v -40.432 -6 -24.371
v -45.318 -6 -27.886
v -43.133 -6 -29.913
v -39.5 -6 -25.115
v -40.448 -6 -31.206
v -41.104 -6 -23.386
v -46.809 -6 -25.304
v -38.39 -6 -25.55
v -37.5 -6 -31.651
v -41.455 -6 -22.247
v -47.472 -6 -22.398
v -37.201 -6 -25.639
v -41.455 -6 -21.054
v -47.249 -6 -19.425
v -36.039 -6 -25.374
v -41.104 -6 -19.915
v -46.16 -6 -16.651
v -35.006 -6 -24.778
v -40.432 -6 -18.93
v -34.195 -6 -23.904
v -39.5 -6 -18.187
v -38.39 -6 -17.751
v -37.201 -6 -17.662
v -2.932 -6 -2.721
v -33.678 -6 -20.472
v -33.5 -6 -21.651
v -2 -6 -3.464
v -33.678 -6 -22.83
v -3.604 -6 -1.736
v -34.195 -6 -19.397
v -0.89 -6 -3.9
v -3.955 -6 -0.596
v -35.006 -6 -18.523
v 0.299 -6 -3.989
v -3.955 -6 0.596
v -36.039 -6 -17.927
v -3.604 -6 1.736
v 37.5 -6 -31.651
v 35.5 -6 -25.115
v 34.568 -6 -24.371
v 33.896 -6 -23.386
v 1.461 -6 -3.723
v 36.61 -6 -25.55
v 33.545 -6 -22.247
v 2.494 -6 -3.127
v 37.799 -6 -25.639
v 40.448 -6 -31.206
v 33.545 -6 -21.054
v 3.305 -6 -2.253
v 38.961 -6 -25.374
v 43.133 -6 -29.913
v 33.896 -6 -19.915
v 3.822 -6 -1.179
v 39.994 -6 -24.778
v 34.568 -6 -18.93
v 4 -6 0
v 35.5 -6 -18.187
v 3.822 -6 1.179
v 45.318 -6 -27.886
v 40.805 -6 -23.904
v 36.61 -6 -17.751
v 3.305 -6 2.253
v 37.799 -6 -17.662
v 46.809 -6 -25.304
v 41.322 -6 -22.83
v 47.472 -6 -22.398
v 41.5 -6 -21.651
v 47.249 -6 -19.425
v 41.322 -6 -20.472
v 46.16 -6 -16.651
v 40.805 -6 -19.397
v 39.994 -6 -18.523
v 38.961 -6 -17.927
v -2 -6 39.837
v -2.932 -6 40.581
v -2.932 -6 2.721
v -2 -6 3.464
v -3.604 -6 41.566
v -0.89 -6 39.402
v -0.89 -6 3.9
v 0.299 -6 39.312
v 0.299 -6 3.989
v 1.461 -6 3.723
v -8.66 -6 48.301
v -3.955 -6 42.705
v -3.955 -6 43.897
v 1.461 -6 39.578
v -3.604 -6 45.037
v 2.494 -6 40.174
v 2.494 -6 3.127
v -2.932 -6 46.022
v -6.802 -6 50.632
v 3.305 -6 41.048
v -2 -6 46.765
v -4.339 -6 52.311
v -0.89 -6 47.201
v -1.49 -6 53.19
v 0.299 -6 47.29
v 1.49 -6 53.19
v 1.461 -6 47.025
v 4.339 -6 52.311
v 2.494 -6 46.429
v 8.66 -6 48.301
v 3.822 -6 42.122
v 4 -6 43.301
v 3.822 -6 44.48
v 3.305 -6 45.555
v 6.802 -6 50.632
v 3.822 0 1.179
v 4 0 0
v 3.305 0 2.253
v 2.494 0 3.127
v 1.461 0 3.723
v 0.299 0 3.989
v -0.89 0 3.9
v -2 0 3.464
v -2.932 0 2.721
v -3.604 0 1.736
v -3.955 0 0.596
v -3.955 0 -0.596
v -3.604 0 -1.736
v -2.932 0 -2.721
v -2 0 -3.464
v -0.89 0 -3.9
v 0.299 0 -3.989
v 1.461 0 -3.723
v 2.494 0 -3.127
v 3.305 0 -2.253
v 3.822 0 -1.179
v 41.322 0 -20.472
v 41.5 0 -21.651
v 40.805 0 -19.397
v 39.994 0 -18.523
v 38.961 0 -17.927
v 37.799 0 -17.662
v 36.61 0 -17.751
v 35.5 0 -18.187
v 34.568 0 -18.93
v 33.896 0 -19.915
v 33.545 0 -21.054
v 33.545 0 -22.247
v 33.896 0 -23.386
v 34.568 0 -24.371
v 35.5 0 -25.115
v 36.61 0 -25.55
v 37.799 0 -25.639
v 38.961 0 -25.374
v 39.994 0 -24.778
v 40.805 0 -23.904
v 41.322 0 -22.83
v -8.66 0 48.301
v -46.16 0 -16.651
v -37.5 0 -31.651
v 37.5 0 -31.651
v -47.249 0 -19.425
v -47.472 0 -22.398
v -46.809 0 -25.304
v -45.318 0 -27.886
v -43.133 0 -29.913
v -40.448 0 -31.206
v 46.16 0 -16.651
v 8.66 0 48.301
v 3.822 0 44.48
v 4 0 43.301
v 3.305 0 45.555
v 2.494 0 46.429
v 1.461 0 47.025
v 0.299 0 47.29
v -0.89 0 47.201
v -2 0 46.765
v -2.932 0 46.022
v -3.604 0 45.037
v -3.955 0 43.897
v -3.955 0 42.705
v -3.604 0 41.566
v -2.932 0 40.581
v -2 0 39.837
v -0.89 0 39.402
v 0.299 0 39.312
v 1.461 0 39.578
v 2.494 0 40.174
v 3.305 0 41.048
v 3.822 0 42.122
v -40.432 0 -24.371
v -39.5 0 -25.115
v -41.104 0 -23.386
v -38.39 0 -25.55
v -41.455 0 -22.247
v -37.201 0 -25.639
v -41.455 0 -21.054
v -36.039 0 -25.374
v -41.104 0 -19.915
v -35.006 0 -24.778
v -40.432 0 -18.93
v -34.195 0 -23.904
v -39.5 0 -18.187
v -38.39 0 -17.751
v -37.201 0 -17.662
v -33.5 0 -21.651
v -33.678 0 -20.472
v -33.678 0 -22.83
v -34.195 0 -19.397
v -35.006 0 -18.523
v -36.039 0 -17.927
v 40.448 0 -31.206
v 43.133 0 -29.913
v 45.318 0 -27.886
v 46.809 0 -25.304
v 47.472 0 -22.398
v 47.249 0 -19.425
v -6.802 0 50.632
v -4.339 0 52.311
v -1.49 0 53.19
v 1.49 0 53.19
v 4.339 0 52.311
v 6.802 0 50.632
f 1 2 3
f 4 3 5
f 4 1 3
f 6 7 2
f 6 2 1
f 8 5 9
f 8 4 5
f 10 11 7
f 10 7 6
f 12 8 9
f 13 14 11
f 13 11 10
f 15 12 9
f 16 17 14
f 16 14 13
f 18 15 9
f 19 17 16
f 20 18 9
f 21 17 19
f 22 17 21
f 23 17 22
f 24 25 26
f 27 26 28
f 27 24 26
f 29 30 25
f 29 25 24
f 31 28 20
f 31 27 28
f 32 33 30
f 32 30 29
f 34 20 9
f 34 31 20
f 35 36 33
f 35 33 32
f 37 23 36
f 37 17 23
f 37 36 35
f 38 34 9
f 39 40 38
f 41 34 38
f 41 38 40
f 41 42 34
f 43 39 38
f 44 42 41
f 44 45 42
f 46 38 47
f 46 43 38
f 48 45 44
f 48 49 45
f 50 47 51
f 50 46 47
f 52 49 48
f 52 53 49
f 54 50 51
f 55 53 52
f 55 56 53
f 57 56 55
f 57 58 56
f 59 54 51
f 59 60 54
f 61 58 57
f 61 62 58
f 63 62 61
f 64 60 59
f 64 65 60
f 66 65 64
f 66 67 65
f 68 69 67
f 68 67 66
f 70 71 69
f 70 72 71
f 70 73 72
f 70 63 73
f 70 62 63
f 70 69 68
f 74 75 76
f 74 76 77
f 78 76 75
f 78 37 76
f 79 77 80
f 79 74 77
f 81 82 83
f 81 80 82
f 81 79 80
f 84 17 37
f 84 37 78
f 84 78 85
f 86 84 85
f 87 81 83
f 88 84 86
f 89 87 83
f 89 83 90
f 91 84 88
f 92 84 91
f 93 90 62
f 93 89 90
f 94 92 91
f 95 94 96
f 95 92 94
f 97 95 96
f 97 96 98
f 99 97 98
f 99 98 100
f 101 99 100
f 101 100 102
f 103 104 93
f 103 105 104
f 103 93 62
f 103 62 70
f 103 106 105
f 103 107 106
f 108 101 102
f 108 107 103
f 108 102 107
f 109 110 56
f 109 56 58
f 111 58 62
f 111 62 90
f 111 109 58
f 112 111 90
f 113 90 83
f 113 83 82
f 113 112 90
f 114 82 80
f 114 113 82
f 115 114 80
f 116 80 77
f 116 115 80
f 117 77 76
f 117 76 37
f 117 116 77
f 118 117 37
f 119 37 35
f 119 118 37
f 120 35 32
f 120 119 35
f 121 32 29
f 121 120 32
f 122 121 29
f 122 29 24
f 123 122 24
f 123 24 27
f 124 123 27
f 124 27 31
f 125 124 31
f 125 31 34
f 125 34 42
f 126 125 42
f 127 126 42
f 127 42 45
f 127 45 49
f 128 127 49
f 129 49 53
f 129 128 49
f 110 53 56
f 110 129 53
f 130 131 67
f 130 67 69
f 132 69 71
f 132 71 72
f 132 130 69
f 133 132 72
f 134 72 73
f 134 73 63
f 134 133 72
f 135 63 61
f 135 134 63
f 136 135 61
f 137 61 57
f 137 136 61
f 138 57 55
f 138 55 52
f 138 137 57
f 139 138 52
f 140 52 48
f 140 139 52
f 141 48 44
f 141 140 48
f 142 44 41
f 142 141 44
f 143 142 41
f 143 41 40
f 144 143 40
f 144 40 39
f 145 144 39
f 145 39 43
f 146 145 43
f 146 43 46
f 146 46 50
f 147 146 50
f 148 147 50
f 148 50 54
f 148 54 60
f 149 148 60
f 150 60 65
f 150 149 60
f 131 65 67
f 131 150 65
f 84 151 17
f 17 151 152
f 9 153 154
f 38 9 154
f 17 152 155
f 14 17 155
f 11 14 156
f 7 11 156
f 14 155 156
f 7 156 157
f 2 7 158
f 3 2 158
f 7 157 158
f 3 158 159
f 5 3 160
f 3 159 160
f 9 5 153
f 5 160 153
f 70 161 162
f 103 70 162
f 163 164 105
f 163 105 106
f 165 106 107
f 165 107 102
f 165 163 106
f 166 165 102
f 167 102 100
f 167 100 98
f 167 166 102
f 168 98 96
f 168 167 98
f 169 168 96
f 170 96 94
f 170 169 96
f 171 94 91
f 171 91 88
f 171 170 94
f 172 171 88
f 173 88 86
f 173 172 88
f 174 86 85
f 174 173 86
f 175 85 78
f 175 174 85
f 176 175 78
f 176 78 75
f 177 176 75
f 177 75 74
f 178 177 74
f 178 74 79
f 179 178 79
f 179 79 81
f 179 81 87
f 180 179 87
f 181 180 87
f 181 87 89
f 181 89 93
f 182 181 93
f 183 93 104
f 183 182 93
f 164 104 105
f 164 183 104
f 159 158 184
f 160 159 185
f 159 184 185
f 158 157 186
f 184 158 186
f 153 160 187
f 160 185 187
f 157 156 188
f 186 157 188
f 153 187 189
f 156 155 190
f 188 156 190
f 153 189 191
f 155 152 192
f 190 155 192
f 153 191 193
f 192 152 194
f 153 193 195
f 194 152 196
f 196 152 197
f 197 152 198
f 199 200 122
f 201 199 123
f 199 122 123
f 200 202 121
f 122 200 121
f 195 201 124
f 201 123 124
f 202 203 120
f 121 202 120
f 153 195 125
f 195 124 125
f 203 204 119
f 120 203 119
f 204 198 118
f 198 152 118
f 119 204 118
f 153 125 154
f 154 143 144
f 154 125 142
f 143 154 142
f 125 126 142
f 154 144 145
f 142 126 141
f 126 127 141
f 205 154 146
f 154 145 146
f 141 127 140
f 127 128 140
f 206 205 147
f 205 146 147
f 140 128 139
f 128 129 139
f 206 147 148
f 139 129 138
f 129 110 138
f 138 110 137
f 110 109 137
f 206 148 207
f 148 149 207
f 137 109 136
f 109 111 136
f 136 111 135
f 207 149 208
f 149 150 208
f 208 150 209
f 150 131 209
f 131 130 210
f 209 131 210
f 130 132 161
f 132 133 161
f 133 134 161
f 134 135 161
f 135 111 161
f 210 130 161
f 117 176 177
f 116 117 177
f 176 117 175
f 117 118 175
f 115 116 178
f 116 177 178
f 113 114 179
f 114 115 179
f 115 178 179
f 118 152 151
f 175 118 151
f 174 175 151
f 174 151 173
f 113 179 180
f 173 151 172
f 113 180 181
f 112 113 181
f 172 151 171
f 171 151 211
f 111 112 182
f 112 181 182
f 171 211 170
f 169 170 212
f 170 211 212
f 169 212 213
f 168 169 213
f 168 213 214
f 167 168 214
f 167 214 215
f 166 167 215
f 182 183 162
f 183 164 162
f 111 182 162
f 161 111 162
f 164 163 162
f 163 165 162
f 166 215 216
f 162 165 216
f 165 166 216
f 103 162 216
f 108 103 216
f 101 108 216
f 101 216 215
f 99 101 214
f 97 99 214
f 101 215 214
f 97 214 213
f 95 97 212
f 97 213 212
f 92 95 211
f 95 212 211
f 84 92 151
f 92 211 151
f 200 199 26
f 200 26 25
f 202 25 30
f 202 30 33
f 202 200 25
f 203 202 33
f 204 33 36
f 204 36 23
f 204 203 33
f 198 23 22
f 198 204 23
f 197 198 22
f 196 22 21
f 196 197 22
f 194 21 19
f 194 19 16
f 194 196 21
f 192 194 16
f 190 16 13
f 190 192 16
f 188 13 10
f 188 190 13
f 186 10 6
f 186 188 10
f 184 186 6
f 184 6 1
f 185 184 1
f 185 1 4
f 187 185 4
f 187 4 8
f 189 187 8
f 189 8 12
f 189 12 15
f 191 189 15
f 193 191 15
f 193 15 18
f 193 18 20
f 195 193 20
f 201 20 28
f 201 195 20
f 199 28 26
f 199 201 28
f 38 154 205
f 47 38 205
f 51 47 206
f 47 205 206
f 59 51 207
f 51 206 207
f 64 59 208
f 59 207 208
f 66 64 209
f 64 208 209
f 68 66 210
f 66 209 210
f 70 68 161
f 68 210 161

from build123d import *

# Parameters (mm, degrees)
SKETCH_R  = 4
PAD_DEPTH = 6


with BuildPart() as part:
    # Sketch → Pad (new body)
    with BuildSketch(Plane.XZ):
        with BuildLine():
            Line((46.160259, -16.650643), (8.660317, 48.301296))
            ThreePointArc((8.660317, 48.301296), (0, 53.301337), (-8.660316, 48.301296))
            Line((-8.660316, 48.301296), (-46.160259, -16.650643))
            ThreePointArc((-46.160259, -16.650643), (-46.160252, -26.650639), (-37.5, -31.650635))
            Line((-37.5, -31.650635), (37.5, -31.650635))
            ThreePointArc((37.5, -31.650635), (46.160252, -26.650639), (46.160259, -16.650643))
        make_face()
        with Locations((0, 43.30127)):
            Circle(SKETCH_R, mode=Mode.SUBTRACT)
        with Locations((37.5, -21.650635)):
            Circle(SKETCH_R, mode=Mode.SUBTRACT)
        with Locations((-37.5, -21.650635)):
            Circle(SKETCH_R, mode=Mode.SUBTRACT)
        Circle(SKETCH_R, mode=Mode.SUBTRACT)
    extrude(amount=PAD_DEPTH)


solid = part.part
